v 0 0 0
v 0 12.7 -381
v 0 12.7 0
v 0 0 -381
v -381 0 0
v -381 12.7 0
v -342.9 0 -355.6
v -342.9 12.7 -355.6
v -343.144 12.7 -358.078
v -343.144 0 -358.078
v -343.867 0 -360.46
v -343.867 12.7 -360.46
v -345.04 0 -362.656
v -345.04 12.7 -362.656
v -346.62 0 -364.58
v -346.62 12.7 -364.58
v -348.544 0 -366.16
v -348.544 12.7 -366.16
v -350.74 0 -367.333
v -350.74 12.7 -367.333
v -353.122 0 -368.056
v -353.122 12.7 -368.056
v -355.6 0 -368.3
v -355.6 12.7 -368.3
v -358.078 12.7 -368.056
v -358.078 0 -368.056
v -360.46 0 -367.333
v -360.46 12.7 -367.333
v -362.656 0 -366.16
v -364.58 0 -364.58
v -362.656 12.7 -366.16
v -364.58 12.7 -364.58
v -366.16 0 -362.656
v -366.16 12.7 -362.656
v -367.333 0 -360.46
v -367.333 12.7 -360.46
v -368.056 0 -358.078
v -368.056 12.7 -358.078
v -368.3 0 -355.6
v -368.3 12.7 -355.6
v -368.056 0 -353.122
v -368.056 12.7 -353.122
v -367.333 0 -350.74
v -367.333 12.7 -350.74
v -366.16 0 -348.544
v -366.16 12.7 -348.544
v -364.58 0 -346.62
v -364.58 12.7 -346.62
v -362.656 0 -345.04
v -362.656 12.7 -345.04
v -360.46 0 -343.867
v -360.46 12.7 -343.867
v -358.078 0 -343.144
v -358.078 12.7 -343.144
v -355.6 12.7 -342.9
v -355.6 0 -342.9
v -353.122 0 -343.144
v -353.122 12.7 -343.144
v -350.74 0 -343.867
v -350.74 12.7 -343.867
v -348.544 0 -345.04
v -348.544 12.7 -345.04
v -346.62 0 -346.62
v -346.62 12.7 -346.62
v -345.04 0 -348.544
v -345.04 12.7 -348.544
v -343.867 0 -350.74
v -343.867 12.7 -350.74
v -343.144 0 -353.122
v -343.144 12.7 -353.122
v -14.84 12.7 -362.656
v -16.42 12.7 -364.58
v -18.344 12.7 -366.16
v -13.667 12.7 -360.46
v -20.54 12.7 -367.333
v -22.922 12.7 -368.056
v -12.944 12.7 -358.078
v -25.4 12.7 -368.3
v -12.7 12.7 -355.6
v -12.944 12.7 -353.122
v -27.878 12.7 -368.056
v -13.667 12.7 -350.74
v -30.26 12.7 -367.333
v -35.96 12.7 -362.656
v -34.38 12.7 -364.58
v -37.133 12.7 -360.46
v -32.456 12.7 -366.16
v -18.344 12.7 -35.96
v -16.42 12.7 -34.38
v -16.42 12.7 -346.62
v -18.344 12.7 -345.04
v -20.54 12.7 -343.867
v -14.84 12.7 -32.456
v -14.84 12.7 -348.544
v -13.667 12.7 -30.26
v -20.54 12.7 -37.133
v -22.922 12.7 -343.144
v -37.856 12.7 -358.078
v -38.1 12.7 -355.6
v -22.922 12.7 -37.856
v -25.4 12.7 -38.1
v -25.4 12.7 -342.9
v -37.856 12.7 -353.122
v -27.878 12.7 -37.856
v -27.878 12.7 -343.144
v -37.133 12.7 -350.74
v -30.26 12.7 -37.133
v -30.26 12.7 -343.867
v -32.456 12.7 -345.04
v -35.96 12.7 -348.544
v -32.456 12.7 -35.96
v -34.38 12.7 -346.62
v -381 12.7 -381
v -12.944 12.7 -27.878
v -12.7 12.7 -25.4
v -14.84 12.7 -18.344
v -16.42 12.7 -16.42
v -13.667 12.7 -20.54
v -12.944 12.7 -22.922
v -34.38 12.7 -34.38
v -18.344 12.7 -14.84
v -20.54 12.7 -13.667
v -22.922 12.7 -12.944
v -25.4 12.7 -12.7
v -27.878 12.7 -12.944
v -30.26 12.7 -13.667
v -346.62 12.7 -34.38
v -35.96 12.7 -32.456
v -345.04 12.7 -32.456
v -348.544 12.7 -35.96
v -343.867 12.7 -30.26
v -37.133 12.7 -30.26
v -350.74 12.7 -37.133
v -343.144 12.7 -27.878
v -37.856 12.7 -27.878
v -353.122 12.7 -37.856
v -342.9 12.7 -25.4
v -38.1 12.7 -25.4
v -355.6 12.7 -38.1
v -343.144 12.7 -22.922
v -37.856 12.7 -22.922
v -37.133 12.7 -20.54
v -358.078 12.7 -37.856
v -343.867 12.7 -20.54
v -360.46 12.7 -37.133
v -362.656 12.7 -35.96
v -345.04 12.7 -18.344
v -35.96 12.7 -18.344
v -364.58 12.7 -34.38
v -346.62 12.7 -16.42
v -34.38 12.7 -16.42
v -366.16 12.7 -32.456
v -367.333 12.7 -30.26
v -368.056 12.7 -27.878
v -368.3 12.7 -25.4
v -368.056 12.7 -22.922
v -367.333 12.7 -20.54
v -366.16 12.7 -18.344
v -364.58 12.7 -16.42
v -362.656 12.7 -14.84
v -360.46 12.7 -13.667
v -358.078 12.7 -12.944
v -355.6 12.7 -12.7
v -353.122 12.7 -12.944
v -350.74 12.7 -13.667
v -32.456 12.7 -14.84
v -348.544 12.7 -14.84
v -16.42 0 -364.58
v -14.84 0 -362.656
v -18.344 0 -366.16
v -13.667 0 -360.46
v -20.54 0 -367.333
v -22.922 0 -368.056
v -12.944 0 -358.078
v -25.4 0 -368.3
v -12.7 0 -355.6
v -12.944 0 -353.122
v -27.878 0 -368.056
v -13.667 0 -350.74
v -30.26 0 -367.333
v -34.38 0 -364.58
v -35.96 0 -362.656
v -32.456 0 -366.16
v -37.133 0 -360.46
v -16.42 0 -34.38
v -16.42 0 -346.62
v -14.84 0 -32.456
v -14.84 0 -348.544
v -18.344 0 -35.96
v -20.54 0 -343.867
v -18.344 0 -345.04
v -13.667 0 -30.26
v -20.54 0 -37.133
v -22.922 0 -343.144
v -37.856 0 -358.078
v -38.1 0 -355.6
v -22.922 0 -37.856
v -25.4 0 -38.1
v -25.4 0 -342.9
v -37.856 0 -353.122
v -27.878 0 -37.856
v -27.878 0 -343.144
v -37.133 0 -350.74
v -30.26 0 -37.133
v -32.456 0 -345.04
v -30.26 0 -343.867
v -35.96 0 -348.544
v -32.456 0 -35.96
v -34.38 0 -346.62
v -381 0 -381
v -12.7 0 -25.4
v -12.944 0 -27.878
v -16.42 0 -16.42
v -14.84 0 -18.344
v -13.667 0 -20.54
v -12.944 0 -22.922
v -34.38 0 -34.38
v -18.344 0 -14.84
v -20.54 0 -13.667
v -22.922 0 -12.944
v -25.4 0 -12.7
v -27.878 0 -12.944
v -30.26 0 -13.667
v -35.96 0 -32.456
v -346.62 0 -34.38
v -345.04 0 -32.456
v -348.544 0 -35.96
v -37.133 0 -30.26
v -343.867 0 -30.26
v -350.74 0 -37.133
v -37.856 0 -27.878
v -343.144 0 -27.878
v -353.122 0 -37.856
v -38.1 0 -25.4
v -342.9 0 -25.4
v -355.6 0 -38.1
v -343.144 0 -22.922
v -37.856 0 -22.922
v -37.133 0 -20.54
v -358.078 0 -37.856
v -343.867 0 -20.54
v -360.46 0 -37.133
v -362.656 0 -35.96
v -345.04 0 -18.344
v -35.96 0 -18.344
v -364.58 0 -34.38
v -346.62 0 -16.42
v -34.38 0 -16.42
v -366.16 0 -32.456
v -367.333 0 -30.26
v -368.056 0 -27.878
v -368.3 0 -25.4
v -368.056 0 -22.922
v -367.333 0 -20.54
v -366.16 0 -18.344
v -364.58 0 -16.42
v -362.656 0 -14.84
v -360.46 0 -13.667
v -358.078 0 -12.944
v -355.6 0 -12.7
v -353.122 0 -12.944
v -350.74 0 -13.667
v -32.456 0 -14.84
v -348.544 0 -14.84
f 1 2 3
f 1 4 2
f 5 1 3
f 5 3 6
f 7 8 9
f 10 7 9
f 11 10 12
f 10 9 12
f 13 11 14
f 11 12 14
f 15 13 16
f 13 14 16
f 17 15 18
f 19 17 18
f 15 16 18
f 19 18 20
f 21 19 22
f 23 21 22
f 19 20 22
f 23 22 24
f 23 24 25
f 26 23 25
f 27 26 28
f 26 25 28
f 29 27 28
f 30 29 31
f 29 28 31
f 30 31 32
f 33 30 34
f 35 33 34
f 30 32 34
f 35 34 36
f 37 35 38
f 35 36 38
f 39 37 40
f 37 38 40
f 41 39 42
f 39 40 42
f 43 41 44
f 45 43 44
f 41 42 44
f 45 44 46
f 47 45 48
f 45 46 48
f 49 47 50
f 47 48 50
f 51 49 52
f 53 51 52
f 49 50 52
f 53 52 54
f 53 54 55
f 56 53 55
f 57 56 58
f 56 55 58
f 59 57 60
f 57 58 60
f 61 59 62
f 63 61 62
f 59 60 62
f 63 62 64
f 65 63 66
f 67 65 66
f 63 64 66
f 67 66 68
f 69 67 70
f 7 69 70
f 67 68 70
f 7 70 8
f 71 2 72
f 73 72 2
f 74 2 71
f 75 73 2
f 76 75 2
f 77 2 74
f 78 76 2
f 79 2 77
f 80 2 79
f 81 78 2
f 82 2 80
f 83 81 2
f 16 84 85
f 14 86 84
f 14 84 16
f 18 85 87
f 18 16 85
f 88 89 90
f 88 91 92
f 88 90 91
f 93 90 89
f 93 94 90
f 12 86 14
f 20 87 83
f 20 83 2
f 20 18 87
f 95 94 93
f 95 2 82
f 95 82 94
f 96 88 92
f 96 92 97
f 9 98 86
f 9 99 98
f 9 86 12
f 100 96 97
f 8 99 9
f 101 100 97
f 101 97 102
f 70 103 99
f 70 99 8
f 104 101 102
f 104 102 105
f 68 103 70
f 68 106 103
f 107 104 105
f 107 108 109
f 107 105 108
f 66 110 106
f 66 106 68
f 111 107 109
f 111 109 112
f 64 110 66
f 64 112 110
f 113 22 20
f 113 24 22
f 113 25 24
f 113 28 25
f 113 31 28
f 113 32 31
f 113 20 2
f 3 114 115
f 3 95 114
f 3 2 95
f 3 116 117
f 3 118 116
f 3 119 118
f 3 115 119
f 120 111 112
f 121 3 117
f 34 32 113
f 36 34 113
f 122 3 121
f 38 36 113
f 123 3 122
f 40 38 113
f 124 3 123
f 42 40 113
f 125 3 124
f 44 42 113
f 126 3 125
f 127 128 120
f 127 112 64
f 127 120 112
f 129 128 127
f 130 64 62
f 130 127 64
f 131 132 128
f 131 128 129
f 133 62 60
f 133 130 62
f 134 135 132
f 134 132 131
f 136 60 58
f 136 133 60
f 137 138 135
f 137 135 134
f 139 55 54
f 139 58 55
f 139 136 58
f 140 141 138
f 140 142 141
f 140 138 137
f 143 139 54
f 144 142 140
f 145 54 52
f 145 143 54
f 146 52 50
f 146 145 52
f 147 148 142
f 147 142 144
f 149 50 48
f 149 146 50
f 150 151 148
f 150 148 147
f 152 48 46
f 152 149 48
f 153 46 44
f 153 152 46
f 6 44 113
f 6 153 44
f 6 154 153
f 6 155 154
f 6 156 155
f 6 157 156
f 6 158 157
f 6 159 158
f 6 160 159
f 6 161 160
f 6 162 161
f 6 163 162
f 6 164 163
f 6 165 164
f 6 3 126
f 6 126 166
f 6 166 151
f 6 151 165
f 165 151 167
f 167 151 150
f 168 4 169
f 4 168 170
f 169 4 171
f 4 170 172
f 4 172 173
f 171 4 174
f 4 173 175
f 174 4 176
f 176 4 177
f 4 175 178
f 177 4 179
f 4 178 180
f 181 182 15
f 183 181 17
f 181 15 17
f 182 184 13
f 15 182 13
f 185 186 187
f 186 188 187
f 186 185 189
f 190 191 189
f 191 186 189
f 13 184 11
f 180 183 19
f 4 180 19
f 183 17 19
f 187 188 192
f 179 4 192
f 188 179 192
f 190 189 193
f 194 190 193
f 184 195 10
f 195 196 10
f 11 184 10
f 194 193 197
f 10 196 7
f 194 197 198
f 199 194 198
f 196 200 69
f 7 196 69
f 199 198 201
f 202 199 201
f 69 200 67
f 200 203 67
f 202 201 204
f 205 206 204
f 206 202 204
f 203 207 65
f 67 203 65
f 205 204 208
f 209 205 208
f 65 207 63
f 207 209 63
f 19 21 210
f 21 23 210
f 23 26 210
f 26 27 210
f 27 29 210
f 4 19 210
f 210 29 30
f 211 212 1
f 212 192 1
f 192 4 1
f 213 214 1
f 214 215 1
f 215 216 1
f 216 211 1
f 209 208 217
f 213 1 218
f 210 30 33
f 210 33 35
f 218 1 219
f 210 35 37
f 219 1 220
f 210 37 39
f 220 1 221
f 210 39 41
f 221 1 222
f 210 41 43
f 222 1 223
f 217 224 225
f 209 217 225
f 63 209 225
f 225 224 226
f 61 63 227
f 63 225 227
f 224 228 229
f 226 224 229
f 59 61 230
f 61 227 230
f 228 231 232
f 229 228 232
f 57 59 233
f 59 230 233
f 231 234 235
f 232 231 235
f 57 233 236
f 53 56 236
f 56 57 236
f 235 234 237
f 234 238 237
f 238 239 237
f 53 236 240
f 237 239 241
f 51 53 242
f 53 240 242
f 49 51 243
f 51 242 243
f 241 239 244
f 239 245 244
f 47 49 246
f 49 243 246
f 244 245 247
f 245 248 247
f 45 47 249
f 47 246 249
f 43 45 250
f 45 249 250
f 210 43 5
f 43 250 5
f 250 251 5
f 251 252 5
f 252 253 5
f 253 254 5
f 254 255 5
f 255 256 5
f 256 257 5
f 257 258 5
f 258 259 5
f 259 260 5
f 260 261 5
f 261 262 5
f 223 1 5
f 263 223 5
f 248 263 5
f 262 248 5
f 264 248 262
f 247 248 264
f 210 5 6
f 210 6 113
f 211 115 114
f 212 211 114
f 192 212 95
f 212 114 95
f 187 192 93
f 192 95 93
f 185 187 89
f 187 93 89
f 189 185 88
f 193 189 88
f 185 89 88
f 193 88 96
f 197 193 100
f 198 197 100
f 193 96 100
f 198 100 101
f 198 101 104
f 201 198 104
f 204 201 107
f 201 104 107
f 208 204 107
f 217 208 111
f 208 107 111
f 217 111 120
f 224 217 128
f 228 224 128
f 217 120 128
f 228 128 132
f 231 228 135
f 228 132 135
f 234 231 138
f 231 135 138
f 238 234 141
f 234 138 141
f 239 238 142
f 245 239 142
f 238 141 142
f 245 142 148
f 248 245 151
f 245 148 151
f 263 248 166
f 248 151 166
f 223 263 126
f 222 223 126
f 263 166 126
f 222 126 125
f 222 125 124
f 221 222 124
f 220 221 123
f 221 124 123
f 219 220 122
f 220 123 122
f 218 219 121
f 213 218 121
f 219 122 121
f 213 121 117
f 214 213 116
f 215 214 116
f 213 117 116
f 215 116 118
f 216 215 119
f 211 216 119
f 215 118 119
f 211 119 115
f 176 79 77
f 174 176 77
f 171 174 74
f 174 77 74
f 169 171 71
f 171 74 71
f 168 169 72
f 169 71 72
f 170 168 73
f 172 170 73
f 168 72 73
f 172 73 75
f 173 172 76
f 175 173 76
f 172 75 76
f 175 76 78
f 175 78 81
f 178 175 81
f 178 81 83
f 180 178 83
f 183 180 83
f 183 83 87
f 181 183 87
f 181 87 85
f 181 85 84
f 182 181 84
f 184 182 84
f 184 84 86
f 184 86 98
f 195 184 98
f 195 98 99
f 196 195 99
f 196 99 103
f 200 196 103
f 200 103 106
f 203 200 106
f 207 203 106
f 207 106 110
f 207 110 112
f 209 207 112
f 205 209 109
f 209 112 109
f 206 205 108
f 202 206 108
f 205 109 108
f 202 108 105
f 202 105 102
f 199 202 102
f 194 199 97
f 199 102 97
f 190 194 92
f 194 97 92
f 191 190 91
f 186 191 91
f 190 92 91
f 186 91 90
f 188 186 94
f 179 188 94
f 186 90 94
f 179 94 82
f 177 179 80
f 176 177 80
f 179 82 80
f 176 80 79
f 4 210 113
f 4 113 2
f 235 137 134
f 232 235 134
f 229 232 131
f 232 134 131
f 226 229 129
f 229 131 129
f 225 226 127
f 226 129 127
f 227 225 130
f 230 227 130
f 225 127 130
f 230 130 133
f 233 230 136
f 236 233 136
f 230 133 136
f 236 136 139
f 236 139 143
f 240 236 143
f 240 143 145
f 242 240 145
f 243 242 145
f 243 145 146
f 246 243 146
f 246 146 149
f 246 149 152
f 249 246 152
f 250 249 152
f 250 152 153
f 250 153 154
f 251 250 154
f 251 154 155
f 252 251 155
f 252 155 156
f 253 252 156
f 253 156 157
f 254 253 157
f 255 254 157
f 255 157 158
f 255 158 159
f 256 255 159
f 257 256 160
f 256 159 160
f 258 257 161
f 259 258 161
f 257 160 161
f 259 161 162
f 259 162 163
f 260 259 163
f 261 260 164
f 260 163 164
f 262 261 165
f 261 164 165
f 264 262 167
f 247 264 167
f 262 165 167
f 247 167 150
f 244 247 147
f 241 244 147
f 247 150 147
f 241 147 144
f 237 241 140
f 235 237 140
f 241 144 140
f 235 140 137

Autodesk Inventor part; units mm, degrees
ref_plane "YZ Plane" through (0, 0, 0) normal (1, 0, 0) x (0, 1, 0)
ref_plane "XZ Plane" through (0, 0, 0) normal (0, 1, 0) x (-1, 0, 0)
ref_plane "XY Plane" through (0, 0, 0) normal (0, 0, 1) x (1, 0, 0)
sketch "Sketch1" plane through (0, 0, 0) normal (0, 1, 0) x (-1, 0, 0)
  line L0 (0, 0) -> (381, 0)
  line L1 (381, 0) -> (381, -381)
  line L2 (381, -381) -> (0, -381)
  line L3 (0, -381) -> (0, 0)
extrude "Extrusion1" add sketch "Sketch1" along normal blind 12.7
sketch "Sketch2" plane through (0, 12.7, 0) normal (0, 1, 0) x (1, 0, 0)
  circle A0 centre (-25.4, 25.4) radius 12.7
  line L0 (0, 0) -> (0, 381) projected
  line L1 (-381, 0) -> (0, 0) projected
extrude "Extrusion2" cut sketch "Sketch2" against normal blind 12.7
sketch "Sketch3" plane through (0, 12.7, 0) normal (0, 1, 0) x (1, 0, 0)
  circle A0 centre (-25.4, 355.6) radius 12.7
  line L0 (0, 381) -> (-381, 381) projected
  line L1 (0, 0) -> (0, 381) projected
extrude "Extrusion3" cut sketch "Sketch3" against normal blind 12.7
sketch "Sketch4" plane through (0, 12.7, 0) normal (0, 1, 0) x (1, 0, 0)
  circle A0 centre (-355.6, 25.4) radius 12.7
  line L0 (-381, 381) -> (-381, 0) projected
  line L1 (-381, 0) -> (0, 0) projected
extrude "Extrusion4" cut sketch "Sketch4" against normal blind 12.7
sketch "Sketch5" plane through (0, 12.7, 0) normal (0, 1, 0) x (1, 0, 0)
  circle A0 centre (-355.6, 355.6) radius 12.7
  line L0 (0, 381) -> (-381, 381) projected
  line L1 (-381, 381) -> (-381, 0) projected
  point P0 (0, 0)
extrude "Extrusion5" cut sketch "Sketch5" against normal blind 12.7
properties part number "upside"
